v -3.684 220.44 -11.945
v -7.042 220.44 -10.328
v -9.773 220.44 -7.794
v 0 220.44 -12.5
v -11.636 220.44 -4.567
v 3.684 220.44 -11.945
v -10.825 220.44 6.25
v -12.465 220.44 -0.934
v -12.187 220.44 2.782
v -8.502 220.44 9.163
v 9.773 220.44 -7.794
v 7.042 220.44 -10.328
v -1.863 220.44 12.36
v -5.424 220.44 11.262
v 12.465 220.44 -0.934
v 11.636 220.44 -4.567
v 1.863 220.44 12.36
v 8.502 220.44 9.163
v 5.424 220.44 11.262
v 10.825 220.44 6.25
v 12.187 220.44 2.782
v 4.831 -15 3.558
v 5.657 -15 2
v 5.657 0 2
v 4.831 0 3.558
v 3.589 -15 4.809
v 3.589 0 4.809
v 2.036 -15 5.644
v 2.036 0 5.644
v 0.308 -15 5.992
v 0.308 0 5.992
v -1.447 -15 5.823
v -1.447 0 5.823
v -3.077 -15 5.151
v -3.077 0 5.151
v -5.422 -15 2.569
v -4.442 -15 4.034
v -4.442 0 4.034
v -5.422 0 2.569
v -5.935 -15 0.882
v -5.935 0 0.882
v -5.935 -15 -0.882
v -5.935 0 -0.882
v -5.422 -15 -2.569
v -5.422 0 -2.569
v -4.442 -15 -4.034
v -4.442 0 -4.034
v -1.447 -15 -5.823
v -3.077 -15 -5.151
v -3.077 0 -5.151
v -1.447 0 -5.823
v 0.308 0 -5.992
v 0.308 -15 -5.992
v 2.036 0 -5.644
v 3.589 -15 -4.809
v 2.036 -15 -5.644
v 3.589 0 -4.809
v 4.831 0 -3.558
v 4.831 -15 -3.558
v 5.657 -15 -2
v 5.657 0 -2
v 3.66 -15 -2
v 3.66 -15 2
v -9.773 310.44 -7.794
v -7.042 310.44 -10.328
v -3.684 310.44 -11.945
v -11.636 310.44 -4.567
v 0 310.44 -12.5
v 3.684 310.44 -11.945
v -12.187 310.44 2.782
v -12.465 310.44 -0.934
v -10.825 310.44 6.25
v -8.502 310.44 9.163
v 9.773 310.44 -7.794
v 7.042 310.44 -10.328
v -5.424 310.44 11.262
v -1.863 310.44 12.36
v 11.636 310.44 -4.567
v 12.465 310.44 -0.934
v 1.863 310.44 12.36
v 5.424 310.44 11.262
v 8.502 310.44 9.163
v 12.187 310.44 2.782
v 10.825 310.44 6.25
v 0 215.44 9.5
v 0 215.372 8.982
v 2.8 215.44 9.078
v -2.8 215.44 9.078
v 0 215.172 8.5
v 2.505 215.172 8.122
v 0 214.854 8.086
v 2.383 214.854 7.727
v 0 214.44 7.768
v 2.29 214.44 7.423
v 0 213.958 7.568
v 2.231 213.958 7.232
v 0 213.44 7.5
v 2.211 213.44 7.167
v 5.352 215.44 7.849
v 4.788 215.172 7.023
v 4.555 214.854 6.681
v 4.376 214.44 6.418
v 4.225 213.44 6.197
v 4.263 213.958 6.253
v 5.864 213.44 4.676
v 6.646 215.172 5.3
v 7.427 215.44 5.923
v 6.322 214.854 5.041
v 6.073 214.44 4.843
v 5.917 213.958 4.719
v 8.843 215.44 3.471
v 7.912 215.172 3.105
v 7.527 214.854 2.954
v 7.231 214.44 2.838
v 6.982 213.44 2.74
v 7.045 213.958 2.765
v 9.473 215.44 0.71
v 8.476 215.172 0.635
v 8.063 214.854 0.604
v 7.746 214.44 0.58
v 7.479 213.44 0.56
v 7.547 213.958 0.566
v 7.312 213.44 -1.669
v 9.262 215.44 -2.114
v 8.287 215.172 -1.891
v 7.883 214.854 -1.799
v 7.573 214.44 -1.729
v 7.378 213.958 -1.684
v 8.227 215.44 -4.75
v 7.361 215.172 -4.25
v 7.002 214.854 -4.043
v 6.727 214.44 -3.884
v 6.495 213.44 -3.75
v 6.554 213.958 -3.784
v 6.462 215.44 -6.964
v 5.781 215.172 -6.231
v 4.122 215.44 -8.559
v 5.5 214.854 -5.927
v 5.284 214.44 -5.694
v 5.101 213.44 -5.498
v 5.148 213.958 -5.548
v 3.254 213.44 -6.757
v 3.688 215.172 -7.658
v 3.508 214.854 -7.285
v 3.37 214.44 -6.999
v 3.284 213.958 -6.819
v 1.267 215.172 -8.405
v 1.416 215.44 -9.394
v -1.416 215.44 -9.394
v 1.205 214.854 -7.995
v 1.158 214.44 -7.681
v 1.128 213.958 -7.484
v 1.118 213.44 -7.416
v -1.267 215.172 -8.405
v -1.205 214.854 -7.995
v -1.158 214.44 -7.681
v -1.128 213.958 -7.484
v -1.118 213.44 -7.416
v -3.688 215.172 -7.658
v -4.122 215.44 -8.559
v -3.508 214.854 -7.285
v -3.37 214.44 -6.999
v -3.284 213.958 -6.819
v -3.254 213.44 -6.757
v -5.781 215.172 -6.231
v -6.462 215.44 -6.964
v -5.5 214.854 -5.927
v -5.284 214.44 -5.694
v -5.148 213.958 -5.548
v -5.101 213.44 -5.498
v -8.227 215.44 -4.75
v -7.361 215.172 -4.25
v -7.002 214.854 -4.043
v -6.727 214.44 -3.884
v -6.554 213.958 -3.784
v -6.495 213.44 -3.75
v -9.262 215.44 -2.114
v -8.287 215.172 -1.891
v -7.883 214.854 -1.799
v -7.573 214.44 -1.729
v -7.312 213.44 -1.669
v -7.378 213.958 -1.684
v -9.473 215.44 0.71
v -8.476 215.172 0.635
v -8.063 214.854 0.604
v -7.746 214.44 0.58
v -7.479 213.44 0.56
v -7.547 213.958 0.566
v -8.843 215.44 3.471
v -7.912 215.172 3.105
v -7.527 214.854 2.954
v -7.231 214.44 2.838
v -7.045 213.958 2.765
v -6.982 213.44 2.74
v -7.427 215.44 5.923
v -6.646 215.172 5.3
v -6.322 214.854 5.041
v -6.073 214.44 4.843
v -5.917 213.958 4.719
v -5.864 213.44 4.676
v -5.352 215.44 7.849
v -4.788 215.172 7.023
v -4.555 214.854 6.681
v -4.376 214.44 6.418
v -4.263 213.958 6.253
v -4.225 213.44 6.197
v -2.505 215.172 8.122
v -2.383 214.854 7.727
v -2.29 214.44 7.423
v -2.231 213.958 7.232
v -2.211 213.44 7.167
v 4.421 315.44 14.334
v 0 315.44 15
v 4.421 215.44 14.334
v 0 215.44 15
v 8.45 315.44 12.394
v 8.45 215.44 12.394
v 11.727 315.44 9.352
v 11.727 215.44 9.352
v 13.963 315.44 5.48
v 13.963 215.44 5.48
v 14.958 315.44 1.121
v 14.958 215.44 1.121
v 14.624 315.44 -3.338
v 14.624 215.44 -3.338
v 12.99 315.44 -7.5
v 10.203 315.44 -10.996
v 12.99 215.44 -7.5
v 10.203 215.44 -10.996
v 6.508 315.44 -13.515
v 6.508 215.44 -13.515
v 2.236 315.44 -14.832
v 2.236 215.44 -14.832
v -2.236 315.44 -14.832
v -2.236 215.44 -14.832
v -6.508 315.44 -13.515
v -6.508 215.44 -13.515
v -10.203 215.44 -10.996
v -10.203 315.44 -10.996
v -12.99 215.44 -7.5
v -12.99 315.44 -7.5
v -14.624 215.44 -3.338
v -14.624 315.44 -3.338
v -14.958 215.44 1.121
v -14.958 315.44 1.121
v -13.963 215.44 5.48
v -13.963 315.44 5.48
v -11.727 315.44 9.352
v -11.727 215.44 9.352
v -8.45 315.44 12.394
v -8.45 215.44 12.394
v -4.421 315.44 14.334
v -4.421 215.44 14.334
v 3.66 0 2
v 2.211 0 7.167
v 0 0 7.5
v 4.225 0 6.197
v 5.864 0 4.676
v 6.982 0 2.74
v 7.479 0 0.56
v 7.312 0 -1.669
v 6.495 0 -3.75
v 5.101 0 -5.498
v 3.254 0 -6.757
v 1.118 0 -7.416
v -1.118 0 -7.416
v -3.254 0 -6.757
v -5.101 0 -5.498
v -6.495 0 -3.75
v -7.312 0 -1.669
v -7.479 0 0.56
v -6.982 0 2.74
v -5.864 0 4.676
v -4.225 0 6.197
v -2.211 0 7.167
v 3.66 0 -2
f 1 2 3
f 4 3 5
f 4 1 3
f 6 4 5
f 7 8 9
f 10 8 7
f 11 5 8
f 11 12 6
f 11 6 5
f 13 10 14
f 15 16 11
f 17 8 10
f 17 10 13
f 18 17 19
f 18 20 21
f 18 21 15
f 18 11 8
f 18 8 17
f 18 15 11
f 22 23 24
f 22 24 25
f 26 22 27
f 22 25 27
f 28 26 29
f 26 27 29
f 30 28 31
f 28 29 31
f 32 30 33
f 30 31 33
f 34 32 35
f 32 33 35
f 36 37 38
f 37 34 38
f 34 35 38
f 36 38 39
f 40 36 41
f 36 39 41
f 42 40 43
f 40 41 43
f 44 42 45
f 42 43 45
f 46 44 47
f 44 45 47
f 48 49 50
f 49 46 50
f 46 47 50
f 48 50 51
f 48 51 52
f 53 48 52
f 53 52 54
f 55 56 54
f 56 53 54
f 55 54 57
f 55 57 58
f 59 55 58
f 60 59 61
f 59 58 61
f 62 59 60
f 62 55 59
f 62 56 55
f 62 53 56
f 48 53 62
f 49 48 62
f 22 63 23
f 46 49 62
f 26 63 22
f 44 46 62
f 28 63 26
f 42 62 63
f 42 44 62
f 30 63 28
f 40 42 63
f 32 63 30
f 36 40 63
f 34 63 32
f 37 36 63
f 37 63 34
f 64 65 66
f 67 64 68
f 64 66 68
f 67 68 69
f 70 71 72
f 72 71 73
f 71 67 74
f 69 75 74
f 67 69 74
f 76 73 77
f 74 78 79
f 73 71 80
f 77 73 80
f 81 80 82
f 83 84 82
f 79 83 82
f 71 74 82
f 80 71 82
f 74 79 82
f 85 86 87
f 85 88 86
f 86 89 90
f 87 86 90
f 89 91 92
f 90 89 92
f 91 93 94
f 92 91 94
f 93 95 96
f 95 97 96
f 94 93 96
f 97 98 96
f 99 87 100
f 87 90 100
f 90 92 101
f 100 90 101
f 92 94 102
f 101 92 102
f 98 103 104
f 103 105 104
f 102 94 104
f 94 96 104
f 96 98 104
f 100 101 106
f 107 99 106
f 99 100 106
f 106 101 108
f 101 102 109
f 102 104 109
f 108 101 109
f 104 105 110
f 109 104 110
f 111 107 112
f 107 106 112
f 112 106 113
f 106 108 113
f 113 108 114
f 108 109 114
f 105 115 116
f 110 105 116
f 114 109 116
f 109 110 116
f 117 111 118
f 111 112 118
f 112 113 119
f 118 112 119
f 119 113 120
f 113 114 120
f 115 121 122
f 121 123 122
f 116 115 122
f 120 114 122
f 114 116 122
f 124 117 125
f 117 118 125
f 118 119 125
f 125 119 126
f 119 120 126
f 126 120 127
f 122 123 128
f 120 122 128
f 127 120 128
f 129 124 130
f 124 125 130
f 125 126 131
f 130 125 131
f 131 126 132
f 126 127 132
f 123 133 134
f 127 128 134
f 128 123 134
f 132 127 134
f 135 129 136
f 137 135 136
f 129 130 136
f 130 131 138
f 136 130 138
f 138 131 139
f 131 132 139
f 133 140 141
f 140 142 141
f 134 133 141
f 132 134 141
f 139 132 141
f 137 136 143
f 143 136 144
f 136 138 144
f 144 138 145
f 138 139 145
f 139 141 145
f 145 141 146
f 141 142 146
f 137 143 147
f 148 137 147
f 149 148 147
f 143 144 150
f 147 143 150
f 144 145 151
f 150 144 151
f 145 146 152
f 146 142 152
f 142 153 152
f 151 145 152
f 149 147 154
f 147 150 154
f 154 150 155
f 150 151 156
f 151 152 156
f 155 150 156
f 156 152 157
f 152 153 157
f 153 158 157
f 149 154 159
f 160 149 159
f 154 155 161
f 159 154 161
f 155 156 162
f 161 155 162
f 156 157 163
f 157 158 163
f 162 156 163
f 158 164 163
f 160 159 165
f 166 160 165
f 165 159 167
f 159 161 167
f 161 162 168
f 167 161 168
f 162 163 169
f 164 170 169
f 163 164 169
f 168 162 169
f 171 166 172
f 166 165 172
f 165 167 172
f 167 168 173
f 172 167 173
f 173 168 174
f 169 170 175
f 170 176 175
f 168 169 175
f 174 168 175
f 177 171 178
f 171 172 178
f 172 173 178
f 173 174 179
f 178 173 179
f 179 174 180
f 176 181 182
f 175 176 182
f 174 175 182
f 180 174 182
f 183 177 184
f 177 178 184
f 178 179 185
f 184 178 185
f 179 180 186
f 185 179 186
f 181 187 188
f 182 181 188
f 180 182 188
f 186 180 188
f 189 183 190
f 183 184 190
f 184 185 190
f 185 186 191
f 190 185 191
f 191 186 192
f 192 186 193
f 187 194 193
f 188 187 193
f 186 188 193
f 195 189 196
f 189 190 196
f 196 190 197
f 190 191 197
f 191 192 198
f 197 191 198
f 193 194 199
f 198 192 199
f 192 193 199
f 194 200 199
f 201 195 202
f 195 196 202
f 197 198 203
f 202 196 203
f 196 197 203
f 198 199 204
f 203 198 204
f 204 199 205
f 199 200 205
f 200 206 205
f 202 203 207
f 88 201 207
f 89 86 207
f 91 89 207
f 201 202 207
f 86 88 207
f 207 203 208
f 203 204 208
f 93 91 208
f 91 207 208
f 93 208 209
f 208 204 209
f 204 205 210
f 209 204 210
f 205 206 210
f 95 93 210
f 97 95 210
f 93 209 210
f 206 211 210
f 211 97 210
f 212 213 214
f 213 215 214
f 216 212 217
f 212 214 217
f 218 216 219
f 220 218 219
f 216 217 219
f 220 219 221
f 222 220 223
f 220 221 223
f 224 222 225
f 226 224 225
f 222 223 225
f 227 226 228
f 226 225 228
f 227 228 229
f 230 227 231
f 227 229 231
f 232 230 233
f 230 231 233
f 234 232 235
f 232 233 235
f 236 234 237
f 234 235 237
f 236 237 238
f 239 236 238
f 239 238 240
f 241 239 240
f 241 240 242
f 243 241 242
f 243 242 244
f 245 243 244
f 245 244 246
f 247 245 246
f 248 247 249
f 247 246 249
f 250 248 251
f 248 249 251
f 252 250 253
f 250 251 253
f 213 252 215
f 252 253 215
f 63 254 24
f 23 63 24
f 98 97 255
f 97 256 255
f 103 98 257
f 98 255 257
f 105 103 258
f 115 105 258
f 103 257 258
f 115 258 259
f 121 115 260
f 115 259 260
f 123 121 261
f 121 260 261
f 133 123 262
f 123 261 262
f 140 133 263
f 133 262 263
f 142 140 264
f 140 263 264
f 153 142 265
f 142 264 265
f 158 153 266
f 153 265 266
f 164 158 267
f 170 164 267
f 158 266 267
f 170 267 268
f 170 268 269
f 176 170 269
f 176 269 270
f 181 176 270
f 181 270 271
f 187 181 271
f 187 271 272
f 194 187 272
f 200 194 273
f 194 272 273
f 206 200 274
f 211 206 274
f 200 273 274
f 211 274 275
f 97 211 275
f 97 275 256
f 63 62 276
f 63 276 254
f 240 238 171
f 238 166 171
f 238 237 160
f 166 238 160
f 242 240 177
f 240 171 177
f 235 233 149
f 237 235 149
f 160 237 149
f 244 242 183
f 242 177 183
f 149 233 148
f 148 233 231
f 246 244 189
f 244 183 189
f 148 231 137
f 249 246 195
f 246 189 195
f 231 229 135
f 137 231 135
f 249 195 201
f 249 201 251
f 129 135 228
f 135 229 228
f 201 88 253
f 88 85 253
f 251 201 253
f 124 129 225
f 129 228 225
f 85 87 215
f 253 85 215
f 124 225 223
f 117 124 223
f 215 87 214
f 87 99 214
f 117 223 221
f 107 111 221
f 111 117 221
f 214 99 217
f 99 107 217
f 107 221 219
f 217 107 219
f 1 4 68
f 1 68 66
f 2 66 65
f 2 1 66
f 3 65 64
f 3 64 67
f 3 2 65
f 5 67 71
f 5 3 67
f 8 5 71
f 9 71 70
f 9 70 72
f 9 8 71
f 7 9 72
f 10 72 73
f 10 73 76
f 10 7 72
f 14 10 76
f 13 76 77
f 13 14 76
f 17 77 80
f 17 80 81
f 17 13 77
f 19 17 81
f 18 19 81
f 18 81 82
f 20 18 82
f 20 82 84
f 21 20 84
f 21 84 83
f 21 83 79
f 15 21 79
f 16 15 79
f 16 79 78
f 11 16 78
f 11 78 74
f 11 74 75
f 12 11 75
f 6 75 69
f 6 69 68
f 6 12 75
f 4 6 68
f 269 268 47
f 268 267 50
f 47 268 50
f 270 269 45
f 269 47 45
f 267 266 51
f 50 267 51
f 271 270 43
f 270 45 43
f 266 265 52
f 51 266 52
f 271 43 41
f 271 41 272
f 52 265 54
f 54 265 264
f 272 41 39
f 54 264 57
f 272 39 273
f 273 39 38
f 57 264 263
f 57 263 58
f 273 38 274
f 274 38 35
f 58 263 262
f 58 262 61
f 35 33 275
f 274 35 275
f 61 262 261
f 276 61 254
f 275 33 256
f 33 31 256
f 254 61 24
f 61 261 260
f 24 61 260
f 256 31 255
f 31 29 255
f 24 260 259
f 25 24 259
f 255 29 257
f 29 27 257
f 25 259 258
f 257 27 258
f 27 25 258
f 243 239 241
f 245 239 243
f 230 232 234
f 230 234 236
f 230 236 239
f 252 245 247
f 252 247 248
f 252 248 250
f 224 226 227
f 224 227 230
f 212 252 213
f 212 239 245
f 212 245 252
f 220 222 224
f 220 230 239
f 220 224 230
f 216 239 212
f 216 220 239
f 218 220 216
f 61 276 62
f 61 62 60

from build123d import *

# Parameters (mm, degrees)
SKETCH1_R           = 7.5
BOSS_EXTRUDE1_DEPTH = 215.44
SKETCH5_R           = 15
BOSS_EXTRUDE5_DEPTH = 5
SKETCH6_R           = 15
SKETCH6_R_2         = 12.5
BOSS_EXTRUDE6_DEPTH = 90
SKETCH7_R           = 15
BOSS_EXTRUDE7_DEPTH = 5
FILLET2_R           = 2
SKETCH9_R           = 6
BOSS_EXTRUDE9_DEPTH = 15
SKETCH12_W          = 15.293303155
SKETCH12_H          = 4
CUT_EXTRUDE3_DEPTH  = 15


with BuildPart() as part:
    # Sketch1 → Boss-Extrude1 (new body)
    with BuildSketch(Plane(origin=(0, 0, 0), x_dir=(1, 0, 0), z_dir=(0, 1, 0))):
        with Locations(Location((0, 0, 0), (0, 0, 270))):
            Circle(SKETCH1_R)
    extrude(amount=BOSS_EXTRUDE1_DEPTH)

    # Sketch5 → Boss-Extrude5 (add)
    with BuildSketch(Plane(origin=(0, 215.44, 0), x_dir=(1, 0, 0), z_dir=(0, 1, 0))):
        with Locations(Location((0, 0, 0), (0, 0, 270))):
            Circle(SKETCH5_R)
    extrude(amount=BOSS_EXTRUDE5_DEPTH)

    # Sketch6 → Boss-Extrude6 (add)
    with BuildSketch(Plane(origin=(0, 220.44, 0), x_dir=(1, 0, 0), z_dir=(0, 1, 0))):
        with Locations(Location((0, 0, 0), (0, 0, 270))):
            Circle(SKETCH6_R)
        with Locations(Location((0, 0, 0), (0, 0, 90))):
            Circle(SKETCH6_R_2, mode=Mode.SUBTRACT)
    extrude(amount=BOSS_EXTRUDE6_DEPTH)

    # Sketch7 → Boss-Extrude7 (add)
    with BuildSketch(Plane(origin=(0, 310.44, 0), x_dir=(1, 0, 0), z_dir=(0, 1, 0))):
        with Locations(Location((0, 0, 0), (0, 0, 270))):
            Circle(SKETCH7_R)
    extrude(amount=BOSS_EXTRUDE7_DEPTH)

    # Fillet2
    fillet2_edges = [part.edges().sort_by_distance(p)[0] for p in [
        (0, 215.44, -7.5),
    ]]
    fillet(fillet2_edges, radius=FILLET2_R)

    # Sketch9 → Boss-Extrude9 (add)
    with BuildSketch(Plane.XZ):
        with Locations(Location((0, 0, 0), (0, 0, 90))):
            Circle(SKETCH9_R)
    extrude(amount=BOSS_EXTRUDE9_DEPTH)

    # Sketch12 → Cut-Extrude3 (cut)
    with BuildSketch(Plane.XZ.offset(15)):
        with Locations((11.306651578, 0)):
            Rectangle(SKETCH12_W, SKETCH12_H)
    extrude(amount=-CUT_EXTRUDE3_DEPTH, mode=Mode.SUBTRACT)


solid = part.part
